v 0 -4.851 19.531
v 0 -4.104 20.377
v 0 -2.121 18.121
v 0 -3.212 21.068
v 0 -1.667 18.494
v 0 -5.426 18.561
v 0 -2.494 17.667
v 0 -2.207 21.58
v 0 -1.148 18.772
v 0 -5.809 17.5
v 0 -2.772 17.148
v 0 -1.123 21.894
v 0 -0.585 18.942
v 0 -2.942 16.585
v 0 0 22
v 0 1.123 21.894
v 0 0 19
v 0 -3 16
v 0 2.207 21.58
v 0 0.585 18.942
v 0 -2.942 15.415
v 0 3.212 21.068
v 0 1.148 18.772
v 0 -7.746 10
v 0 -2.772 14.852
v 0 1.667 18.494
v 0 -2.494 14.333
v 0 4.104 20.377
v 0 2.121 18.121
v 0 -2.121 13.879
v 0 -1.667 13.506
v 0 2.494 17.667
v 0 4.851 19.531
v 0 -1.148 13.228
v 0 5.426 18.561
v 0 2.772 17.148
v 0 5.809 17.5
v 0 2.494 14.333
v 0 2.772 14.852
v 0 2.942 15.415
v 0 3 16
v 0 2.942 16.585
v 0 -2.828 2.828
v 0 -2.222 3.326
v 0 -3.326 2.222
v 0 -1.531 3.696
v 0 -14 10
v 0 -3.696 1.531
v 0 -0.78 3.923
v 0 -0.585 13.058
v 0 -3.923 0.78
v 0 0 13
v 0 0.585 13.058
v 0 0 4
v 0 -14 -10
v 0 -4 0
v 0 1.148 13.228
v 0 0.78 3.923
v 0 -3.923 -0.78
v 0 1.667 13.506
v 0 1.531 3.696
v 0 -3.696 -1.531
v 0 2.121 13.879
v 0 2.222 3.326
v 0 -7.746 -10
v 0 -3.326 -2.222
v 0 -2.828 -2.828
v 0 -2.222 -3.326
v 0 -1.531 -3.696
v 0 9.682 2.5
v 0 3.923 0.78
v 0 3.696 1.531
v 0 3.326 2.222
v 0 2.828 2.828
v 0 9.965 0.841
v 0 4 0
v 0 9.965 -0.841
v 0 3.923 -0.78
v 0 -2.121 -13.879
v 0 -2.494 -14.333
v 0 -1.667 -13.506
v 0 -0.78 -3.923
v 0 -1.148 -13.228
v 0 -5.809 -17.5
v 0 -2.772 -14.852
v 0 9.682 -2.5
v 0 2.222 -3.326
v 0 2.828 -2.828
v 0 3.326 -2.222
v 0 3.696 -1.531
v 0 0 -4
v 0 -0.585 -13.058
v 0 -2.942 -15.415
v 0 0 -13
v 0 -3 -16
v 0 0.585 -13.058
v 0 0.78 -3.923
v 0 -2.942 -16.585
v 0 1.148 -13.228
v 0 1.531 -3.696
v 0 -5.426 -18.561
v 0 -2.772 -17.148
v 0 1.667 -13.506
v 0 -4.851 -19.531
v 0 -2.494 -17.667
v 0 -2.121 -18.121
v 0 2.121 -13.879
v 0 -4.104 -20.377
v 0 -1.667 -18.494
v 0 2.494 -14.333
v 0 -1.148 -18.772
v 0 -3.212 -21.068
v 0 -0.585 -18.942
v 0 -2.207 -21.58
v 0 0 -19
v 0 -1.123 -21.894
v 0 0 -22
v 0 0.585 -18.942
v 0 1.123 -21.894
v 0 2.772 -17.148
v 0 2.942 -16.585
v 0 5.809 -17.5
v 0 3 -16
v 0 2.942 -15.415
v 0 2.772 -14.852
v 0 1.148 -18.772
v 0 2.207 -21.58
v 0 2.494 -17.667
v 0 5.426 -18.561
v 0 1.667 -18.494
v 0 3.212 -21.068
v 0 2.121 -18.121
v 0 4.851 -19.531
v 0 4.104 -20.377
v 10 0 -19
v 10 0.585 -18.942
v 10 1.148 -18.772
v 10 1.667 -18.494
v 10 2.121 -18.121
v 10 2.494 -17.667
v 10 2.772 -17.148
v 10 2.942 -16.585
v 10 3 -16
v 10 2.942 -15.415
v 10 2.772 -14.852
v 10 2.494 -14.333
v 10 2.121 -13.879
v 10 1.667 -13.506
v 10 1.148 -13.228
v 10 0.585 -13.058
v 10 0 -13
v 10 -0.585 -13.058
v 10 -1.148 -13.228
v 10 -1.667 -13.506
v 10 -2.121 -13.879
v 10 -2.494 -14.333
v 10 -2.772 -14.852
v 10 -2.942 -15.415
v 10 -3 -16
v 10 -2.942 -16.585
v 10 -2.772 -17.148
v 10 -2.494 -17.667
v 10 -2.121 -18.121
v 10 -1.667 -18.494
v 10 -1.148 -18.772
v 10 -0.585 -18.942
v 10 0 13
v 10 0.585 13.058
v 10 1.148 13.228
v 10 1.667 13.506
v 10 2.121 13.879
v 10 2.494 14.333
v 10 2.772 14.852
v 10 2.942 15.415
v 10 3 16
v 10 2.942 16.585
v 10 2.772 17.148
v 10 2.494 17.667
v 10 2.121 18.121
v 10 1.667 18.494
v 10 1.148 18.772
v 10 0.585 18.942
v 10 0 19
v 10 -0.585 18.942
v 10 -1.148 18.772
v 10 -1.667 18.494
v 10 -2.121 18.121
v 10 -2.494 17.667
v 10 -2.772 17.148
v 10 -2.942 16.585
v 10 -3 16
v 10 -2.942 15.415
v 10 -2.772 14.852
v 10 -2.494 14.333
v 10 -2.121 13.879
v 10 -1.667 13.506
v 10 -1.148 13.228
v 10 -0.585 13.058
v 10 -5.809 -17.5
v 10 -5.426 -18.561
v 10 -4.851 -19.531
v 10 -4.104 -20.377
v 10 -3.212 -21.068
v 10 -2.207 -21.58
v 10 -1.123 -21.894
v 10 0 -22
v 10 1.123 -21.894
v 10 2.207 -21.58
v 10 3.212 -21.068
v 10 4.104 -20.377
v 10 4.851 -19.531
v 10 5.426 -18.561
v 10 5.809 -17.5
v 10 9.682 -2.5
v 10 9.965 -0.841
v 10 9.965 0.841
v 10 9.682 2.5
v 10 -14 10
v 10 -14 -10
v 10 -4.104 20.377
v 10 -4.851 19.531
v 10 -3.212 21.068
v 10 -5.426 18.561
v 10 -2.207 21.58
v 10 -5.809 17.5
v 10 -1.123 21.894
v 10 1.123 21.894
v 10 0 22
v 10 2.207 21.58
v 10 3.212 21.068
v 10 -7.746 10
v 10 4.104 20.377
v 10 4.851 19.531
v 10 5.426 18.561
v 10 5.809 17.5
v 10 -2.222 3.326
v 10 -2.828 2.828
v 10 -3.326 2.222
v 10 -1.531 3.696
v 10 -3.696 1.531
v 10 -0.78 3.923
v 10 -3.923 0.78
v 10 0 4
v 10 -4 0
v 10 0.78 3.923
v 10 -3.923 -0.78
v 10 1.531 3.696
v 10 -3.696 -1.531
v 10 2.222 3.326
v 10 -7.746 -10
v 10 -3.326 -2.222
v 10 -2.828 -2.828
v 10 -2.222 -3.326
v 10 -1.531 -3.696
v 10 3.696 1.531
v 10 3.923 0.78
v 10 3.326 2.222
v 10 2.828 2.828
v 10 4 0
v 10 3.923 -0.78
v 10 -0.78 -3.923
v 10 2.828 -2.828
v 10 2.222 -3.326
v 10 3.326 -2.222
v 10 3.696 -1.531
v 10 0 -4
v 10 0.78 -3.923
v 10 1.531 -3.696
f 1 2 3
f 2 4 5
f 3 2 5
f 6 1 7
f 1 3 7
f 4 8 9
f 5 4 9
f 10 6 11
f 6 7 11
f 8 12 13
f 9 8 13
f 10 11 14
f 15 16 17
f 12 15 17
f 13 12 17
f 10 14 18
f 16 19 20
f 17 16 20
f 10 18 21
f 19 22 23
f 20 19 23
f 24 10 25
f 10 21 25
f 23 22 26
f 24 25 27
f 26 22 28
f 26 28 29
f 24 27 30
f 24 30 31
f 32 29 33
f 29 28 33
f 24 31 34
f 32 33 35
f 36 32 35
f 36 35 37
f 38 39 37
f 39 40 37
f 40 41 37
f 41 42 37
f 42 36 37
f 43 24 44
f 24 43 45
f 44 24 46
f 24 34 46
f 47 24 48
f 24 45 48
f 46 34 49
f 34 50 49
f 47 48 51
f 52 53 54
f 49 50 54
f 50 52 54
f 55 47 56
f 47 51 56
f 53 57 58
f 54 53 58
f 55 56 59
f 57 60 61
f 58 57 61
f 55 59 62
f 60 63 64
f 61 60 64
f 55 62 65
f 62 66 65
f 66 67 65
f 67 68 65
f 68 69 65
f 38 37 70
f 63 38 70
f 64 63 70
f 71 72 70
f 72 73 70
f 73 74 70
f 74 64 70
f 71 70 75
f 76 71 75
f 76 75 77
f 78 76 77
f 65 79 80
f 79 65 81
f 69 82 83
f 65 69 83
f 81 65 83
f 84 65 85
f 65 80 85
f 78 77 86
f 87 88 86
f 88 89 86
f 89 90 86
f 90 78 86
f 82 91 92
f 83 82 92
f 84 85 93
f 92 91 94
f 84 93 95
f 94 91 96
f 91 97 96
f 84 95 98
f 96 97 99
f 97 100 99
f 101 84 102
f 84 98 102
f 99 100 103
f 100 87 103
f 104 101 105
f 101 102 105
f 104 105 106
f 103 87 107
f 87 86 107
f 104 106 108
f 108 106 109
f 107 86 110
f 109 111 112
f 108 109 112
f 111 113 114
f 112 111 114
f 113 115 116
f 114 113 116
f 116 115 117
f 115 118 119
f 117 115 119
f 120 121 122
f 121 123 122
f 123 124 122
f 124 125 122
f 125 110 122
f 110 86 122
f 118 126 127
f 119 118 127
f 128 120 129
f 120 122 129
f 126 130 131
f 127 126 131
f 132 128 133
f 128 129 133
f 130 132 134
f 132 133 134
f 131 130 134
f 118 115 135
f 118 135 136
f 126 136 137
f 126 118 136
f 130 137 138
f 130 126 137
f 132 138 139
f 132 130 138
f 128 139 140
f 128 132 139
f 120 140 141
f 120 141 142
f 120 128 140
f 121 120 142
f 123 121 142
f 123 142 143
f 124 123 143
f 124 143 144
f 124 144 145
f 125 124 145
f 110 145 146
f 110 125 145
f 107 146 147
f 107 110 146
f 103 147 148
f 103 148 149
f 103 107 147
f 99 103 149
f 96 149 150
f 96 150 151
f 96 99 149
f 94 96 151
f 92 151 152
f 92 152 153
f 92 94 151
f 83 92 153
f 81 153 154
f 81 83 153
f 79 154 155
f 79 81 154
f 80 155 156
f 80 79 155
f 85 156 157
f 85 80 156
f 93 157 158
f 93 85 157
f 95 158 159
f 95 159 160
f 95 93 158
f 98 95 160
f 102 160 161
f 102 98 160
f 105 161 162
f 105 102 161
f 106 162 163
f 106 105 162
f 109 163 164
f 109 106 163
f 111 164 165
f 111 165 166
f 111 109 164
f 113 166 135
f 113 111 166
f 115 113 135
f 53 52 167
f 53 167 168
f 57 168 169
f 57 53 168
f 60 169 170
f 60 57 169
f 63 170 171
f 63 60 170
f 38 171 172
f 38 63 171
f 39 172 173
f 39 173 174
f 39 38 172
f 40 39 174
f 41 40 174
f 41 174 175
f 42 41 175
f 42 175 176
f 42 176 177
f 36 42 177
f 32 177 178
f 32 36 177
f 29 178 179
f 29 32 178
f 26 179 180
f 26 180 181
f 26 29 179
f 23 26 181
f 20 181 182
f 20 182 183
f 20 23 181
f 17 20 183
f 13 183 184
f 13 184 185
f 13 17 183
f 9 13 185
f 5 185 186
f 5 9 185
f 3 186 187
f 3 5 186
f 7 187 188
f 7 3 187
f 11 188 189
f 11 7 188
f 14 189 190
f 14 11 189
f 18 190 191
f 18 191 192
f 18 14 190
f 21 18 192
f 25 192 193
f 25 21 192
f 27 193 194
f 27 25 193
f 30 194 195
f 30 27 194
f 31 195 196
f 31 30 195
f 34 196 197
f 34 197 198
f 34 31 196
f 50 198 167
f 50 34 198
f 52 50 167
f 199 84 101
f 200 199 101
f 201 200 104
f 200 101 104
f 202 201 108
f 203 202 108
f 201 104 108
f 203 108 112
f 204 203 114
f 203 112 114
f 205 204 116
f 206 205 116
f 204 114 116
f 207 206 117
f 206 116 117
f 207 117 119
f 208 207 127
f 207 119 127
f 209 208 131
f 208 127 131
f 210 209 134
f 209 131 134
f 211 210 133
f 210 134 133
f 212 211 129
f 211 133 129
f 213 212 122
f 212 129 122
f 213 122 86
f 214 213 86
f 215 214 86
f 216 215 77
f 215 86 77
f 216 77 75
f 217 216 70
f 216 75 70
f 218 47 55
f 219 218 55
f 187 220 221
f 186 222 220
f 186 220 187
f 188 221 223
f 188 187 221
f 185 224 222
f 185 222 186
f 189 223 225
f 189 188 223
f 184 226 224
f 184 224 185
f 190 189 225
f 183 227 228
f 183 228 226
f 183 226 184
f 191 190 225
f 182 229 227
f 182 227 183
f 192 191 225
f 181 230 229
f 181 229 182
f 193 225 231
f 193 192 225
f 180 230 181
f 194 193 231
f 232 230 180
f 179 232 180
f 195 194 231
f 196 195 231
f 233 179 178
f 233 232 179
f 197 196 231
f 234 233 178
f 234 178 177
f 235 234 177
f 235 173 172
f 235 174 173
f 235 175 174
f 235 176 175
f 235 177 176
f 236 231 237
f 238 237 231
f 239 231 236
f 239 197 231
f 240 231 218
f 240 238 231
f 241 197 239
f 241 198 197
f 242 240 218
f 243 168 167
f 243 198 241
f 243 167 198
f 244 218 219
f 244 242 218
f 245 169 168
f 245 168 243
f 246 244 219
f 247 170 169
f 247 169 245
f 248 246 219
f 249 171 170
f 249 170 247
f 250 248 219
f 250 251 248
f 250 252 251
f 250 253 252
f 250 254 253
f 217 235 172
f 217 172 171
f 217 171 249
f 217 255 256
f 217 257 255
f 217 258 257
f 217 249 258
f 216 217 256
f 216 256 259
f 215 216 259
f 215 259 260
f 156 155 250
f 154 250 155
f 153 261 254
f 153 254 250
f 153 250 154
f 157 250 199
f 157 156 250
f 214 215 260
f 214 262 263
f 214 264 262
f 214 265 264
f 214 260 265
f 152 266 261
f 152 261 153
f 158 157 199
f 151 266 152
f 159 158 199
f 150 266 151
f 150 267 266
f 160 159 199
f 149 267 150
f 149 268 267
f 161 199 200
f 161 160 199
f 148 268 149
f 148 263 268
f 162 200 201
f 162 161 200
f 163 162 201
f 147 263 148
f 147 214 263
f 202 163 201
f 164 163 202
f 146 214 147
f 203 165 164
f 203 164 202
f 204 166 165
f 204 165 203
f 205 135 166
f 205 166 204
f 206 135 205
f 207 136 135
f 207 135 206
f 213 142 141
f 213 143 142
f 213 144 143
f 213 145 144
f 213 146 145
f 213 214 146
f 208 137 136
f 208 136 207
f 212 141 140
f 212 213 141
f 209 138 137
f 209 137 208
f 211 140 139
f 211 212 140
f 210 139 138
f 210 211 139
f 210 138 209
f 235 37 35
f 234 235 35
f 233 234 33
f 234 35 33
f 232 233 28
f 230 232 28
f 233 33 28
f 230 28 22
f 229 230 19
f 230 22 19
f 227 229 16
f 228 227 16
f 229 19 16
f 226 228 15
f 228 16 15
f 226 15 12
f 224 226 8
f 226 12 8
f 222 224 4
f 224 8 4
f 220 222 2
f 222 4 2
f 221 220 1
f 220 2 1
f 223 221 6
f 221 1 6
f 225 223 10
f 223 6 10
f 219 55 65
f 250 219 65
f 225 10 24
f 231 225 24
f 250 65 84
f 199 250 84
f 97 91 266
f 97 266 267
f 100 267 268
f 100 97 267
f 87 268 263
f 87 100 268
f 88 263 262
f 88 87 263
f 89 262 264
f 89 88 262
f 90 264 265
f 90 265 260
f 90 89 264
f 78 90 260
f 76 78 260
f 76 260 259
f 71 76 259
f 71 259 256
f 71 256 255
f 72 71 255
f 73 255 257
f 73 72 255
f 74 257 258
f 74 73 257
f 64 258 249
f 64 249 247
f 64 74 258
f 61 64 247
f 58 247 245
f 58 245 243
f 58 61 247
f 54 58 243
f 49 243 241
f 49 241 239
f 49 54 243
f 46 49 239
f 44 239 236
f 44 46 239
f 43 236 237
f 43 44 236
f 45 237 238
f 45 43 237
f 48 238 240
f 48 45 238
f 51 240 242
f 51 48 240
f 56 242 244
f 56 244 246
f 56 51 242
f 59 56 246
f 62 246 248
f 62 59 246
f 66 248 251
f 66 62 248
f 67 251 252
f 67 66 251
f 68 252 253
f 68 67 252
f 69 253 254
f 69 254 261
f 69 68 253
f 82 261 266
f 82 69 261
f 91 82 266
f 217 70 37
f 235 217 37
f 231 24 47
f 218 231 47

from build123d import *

# Parameters (mm, degrees)
SKETCH1_R           = 4
SKETCH1_R_2         = 3
BOSS_EXTRUDE1_DEPTH = 10


with BuildPart() as part:
    # Sketch1 → Boss-Extrude1 (new body)
    with BuildSketch(Plane(origin=(0, 0, 0), x_dir=(0, 0, -1), z_dir=(1, 0, 0))):
        with BuildLine():
            Line((-10, -7.745966692), (-10, -14))
            Line((-10, -14), (10, -14))
            Line((10, -14), (10, -7.745966692))
            Line((10, -7.745966692), (17.5, -5.809475019))
            ThreePointArc((17.5, -5.809475019), (22, 0), (17.5, 5.809475019))
            Line((17.5, 5.809475019), (2.5, 9.682458366))
            ThreePointArc((2.5, 9.682458366), (0, 10), (-2.5, 9.682458366))
            Line((-2.5, 9.682458366), (-17.5, 5.809475019))
            ThreePointArc((-17.5, 5.809475019), (-22, 0), (-17.5, -5.809475019))
            Line((-17.5, -5.809475019), (-10, -7.745966692))
        make_face()
        Circle(SKETCH1_R, mode=Mode.SUBTRACT)
        with Locations((16, 0)):
            Circle(SKETCH1_R_2, mode=Mode.SUBTRACT)
        with Locations((-16, 0)):
            Circle(SKETCH1_R_2, mode=Mode.SUBTRACT)
    extrude(amount=BOSS_EXTRUDE1_DEPTH)


solid = part.part
